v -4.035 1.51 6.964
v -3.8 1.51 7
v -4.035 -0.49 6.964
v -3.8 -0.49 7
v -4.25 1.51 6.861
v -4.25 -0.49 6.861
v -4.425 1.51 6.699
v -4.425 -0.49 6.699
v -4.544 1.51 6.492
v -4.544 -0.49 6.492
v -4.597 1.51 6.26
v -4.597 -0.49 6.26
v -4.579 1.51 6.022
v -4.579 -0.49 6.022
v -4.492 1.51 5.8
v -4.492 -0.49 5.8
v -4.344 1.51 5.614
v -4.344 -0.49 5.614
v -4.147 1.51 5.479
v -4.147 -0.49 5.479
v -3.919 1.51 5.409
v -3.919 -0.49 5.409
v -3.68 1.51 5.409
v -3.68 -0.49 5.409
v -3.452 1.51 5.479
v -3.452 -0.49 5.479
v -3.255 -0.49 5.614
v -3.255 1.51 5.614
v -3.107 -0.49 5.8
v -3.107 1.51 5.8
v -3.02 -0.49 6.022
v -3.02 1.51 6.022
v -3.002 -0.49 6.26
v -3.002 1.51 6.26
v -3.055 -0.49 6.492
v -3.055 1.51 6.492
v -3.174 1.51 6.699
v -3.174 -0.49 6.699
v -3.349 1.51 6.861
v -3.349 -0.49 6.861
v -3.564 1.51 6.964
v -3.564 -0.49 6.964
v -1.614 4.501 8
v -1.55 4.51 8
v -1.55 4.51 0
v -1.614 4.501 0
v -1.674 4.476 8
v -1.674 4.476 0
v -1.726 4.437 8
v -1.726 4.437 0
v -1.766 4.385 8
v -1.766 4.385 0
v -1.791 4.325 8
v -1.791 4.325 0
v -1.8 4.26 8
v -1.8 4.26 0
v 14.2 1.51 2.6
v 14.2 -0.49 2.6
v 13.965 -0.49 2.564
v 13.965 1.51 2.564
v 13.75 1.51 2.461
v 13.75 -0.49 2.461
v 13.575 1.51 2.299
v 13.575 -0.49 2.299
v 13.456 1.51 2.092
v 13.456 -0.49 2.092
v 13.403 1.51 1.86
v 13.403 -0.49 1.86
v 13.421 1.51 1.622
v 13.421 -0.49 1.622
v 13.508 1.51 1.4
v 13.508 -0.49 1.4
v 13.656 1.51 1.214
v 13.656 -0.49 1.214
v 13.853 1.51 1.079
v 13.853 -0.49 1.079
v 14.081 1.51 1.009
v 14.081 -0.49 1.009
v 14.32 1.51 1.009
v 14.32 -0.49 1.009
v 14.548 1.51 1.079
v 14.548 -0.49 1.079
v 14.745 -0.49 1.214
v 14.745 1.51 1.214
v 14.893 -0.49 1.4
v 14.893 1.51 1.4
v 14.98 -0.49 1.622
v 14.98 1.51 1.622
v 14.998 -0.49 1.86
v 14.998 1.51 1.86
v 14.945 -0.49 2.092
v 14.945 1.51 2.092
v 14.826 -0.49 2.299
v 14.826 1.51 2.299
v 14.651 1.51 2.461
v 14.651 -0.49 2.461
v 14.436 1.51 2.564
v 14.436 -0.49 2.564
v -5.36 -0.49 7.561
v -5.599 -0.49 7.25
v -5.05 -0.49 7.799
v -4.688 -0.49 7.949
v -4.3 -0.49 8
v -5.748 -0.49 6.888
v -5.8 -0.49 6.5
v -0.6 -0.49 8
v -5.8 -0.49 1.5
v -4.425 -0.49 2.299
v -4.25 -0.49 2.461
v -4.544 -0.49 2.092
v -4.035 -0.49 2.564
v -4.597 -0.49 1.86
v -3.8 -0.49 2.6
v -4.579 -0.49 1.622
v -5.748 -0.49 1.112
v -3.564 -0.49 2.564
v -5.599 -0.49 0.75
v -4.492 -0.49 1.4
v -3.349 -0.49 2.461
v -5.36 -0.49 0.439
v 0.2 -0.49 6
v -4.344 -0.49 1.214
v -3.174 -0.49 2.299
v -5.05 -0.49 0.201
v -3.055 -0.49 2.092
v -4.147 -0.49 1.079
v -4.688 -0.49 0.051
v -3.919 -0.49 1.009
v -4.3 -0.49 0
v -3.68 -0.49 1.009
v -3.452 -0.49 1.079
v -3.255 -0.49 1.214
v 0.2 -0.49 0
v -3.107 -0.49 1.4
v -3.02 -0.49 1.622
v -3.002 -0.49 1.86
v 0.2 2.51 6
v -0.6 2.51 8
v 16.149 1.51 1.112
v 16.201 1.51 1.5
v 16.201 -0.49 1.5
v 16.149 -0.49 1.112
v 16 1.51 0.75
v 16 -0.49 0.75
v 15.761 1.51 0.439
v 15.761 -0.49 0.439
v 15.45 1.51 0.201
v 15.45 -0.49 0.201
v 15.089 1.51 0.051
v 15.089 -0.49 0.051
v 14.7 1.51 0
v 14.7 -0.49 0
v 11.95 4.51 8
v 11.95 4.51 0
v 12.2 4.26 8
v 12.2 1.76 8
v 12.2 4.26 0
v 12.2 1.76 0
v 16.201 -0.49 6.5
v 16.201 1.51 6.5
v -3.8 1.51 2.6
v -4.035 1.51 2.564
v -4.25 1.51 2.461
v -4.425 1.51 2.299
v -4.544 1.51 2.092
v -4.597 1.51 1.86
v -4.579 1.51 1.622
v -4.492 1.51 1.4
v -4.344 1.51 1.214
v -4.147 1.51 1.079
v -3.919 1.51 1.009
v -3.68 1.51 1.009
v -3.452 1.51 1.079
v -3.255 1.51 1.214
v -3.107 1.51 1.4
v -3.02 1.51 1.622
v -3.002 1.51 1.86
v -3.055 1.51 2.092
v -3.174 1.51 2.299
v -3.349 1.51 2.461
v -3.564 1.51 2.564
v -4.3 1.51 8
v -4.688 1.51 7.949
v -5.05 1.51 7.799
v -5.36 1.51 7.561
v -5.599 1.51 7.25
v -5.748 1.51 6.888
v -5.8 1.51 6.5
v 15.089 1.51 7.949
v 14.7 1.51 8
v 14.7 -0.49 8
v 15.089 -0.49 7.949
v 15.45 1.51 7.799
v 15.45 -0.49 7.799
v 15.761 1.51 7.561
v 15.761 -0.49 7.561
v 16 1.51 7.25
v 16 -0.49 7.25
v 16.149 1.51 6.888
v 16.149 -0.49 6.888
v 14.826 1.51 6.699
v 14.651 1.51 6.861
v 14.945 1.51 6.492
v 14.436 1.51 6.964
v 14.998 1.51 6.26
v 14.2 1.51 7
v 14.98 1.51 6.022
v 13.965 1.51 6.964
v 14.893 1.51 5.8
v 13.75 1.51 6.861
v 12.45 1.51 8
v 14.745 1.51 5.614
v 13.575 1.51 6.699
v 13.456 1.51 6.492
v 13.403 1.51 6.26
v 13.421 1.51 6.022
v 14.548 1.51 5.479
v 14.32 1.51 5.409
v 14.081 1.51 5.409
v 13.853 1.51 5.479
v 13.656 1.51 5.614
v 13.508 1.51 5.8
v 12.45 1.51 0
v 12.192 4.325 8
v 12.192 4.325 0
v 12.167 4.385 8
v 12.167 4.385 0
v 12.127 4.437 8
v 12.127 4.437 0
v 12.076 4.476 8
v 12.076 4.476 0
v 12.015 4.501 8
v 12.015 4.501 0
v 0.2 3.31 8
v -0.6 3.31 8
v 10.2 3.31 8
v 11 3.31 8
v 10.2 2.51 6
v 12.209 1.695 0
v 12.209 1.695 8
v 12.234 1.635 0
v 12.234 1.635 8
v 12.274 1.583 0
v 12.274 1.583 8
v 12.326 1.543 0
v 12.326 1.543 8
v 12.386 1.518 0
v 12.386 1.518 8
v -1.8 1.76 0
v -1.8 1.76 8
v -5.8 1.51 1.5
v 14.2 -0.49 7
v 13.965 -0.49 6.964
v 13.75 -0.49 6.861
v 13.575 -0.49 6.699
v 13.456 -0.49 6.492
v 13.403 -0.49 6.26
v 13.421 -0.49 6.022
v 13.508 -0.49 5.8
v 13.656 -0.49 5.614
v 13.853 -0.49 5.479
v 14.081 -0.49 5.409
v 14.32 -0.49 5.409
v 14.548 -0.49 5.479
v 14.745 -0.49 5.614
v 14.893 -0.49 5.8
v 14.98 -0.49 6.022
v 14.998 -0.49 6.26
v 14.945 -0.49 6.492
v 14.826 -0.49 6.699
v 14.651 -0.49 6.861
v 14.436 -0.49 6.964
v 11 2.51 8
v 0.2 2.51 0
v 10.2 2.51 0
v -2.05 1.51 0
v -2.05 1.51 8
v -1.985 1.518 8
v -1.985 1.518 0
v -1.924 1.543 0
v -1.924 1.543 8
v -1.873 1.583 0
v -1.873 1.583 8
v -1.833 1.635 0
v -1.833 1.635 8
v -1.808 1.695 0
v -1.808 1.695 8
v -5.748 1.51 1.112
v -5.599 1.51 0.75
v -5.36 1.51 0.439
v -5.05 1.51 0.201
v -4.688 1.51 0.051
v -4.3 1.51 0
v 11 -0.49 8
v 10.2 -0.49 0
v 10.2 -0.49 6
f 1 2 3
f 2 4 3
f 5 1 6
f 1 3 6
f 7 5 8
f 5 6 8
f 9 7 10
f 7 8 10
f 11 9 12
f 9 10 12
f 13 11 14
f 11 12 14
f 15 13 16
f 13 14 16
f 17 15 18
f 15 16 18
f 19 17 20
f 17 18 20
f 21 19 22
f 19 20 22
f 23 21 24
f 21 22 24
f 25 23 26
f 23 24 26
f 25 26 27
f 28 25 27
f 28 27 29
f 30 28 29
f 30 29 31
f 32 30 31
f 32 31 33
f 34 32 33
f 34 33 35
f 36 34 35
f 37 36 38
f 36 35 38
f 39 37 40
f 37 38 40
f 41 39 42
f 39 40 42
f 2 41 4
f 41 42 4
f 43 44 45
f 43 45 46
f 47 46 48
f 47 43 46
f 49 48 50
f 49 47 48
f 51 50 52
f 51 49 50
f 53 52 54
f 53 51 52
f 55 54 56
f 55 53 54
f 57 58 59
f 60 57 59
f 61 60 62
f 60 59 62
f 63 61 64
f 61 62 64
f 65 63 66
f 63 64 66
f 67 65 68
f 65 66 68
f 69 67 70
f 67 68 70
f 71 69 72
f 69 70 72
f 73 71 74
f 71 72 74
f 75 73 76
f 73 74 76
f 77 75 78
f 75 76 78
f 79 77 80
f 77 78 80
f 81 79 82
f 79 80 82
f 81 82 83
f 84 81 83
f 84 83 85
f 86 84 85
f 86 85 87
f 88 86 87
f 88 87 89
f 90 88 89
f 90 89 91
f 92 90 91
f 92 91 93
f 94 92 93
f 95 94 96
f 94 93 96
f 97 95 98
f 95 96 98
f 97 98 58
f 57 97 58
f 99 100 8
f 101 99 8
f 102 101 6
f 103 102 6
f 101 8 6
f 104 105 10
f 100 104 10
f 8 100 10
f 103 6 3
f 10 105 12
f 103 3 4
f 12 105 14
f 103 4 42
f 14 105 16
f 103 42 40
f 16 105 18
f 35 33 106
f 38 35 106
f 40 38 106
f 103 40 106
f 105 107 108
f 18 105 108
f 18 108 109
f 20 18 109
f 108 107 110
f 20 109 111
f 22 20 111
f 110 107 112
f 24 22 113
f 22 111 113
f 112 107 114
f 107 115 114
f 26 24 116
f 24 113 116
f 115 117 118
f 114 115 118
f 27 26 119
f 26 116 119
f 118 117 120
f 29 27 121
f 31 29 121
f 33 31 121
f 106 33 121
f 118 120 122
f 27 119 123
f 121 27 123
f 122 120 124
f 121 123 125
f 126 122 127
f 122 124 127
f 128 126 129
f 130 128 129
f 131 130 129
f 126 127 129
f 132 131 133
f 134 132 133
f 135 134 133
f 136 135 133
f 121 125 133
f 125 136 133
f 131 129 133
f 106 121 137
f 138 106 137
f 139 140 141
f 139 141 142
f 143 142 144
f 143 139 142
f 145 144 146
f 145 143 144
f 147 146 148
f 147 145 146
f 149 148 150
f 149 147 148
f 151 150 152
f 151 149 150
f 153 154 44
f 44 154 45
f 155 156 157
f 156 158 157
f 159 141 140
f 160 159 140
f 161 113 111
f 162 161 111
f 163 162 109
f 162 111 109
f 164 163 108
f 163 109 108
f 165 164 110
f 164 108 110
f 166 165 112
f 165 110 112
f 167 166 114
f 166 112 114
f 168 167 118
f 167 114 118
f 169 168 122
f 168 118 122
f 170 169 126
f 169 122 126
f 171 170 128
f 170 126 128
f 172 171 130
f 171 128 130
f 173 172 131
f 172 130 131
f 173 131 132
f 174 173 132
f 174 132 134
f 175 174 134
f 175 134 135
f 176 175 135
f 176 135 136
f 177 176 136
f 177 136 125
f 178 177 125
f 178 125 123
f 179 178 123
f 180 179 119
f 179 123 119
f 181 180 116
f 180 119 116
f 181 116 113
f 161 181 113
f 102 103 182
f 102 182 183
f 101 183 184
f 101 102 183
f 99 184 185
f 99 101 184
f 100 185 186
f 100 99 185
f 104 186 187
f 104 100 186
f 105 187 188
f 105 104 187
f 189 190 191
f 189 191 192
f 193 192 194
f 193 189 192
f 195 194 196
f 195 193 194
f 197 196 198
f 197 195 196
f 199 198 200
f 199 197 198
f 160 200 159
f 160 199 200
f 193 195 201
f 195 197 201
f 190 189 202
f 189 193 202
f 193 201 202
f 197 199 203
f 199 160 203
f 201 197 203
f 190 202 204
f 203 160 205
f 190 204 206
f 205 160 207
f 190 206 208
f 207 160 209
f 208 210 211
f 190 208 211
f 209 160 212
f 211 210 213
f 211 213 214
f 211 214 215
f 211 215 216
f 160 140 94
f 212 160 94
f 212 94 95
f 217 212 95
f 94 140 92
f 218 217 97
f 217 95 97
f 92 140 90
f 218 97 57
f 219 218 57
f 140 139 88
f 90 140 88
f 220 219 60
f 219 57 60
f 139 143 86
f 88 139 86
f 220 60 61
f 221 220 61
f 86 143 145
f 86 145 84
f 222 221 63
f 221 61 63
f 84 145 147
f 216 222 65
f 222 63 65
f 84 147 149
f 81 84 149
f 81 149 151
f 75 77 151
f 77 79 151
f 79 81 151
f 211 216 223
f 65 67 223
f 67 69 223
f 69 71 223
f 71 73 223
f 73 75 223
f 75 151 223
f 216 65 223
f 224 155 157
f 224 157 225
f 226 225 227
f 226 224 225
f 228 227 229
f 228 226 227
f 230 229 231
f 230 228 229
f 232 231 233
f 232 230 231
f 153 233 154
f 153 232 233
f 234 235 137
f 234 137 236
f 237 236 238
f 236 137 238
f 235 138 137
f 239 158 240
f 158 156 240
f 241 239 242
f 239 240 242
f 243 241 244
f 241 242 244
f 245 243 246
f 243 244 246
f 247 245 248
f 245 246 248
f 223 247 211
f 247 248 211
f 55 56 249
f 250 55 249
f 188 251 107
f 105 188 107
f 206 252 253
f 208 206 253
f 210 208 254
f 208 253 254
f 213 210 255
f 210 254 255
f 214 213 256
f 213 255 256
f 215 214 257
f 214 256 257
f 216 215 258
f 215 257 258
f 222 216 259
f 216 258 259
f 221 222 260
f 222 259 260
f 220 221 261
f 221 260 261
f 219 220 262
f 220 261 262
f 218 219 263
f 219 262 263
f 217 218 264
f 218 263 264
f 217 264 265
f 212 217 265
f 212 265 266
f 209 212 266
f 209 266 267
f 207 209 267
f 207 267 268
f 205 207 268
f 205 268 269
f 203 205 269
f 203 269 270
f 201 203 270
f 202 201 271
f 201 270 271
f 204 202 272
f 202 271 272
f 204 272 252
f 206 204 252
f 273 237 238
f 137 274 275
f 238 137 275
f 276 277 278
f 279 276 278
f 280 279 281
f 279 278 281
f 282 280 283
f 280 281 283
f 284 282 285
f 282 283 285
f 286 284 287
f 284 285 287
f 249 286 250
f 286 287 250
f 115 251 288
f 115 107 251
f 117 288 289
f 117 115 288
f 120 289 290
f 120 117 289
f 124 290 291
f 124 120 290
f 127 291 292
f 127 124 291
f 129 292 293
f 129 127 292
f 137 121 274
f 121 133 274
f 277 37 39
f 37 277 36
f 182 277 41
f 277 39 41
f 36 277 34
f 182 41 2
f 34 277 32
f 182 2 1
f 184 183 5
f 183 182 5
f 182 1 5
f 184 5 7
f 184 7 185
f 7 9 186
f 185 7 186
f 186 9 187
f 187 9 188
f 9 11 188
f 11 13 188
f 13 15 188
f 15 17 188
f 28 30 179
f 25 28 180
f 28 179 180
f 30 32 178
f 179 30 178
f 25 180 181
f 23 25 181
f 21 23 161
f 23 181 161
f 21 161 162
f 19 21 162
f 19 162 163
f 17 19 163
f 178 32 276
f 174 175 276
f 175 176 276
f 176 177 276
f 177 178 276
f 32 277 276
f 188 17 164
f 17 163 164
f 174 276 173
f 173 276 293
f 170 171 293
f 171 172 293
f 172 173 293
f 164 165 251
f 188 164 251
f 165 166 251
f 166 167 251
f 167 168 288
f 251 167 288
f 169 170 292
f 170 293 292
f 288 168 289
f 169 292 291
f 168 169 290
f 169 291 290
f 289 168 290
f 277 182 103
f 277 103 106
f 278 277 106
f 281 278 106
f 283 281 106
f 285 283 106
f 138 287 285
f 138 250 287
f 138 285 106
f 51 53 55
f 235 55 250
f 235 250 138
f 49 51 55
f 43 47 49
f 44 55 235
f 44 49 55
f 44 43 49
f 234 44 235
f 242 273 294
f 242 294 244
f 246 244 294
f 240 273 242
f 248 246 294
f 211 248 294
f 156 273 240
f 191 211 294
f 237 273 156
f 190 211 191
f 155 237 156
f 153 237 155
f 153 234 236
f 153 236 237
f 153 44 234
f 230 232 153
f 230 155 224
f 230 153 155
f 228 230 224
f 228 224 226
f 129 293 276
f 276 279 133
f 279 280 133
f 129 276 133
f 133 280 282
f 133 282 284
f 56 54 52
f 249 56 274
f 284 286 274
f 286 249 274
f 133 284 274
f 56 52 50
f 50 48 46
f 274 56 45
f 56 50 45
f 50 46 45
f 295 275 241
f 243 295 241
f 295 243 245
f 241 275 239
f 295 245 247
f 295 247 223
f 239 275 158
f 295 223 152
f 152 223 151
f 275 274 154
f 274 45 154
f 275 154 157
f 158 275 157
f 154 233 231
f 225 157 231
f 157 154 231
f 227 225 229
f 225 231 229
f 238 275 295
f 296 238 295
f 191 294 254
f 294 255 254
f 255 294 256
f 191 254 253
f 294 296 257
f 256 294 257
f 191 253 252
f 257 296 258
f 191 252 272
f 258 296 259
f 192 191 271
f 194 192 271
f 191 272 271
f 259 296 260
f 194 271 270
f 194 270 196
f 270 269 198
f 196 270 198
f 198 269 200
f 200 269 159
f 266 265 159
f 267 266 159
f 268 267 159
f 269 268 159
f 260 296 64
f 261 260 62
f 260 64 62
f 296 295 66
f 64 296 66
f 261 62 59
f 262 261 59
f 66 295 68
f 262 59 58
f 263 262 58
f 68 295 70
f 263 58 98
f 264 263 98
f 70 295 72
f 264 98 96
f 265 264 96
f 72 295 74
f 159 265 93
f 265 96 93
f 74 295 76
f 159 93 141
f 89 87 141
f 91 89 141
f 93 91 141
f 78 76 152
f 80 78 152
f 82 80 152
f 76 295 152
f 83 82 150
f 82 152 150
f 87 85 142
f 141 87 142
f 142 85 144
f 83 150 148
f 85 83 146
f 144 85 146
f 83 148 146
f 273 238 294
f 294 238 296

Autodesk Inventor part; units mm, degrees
ref_plane "YZ Plane" through (0, 0, 0) normal (1, 0, 0) x (0, 1, 0)
ref_plane "XZ Plane" through (0, 0, 0) normal (0, 1, 0) x (-1, 0, 0)
ref_plane "XY Plane" through (0, 0, 0) normal (0, 0, 1) x (1, 0, 0)
sketch "Sketch1" plane through (0, 0, 0) normal (0, 0, 1) x (1, 0, 0)
  line L0 (-5.7995, -0.4901) -> (0.2005, -0.4901)
  line L1 (0.2005, -0.4901) -> (0.2005, 2.5099)
  line L2 (0.2005, 2.5099) -> (10.2005, 2.5099)
  line L3 (10.2005, 2.5099) -> (10.2005, -0.4901)
  line L4 (10.2005, -0.4901) -> (16.2005, -0.4901)
  line L5 (16.2005, -0.4901) -> (16.2005, 1.5099)
  line L6 (16.2005, 1.5099) -> (12.2005, 1.5099)
  line L7 (12.2005, 1.5099) -> (12.2005, 4.5099)
  line L8 (12.2005, 4.5099) -> (-1.7995, 4.5099)
  line L9 (-1.7995, 4.5099) -> (-1.7995, 1.5099)
  line L10 (-1.7995, 1.5099) -> (-5.7995, 1.5099)
  line L11 (-5.7995, 1.5099) -> (-5.7995, -0.4901)
  point P0 (0, 0)
  dimension "d0" = 3
  dimension "d1" = 2
  dimension "d2" = 2
  dimension "d3" = 2
  dimension "d4" = 2
  dimension "d5" = 2
  dimension "d6" = 10
  dimension "d7" = 6
  dimension "d8" = 6
extrude "Extrusion1" add sketch "Sketch1" along normal blind 8
sketch "Sketch2" plane through (12.2005, 1.5099, 0) normal (0, 1, 0) x (1, 0, 0)
  line L0 (-14, 0) -> (-18, 0) projected
  line L1 (-18, 0) -> (-18, -8) projected
  line L2 (-14, -8) -> (-18, -8) projected
  line L3 (-14, 0) -> (-14, -8) projected
  line L4 (4, 0) -> (0, 0) projected
  line L5 (0, 0) -> (0, -8) projected
  line L6 (4, -8) -> (0, -8) projected
  line L7 (4, 0) -> (4, -8) projected
  point P0 (-12.2005, 0)
  point P1 (-16, -1.8)
  point P2 (-16, -6.2)
  point P3 (2, -1.8)
  point P4 (2, -6.2)
  dimension "d11" = 1.8
  dimension "d12" = 1.8
  dimension "d13" = 2
  dimension "d14" = 2
hole "Hole1" at (-3.7995, 1.5099, 1.8) at (-3.7995, 1.5099, 6.2) at (14.2005, 1.5099, 1.8) at (14.2005, 1.5099, 6.2) direction (0, -1, 0) diameter 1.6 depth 8 tip angle 118
fillet "Fillet1" radius 1.5 4 edges at (16.2005, 0.5099, 0) (16.2005, 0.5099, 8) (-5.7995, 0.5099, 0) (-5.7995, 0.5099, 8)
fillet "Fillet2" radius 0.25 4 edges at (12.2005, 4.5099, 4) (12.2005, 1.5099, 4) (-1.7995, 1.5099, 4) (-1.7995, 4.5099, 4)
chamfer "Chamfer1" distance 0.8 distance2 2 1 edges at (5.2005, 2.5099, 8) measured on face at (3.5338, 3.8432, 8)
chamfer "Chamfer2" distance 0.8 distance2 2 1 edges at (0.2005, 1.0099, 8) measured on face at (3.5338, 4.1099, 8)
chamfer "Chamfer3" distance 0.8 distance2 2 1 edges at (10.2005, 1.0099, 8) measured on face at (3.5338, 4.1099, 8)
equation "\"d2\" = d1"
equation "\"d3\" = d1"
equation "\"d4\" = d1"
equation "\"d5\" = d1"
equation "\"d7\" = d8"
equation "\"d12\" = d11"
equation "\"d14\" = d13"
properties part number "CNCM_ALU_Visial_inspection_tray_bucket_mount" material "Aluminum 6061"
